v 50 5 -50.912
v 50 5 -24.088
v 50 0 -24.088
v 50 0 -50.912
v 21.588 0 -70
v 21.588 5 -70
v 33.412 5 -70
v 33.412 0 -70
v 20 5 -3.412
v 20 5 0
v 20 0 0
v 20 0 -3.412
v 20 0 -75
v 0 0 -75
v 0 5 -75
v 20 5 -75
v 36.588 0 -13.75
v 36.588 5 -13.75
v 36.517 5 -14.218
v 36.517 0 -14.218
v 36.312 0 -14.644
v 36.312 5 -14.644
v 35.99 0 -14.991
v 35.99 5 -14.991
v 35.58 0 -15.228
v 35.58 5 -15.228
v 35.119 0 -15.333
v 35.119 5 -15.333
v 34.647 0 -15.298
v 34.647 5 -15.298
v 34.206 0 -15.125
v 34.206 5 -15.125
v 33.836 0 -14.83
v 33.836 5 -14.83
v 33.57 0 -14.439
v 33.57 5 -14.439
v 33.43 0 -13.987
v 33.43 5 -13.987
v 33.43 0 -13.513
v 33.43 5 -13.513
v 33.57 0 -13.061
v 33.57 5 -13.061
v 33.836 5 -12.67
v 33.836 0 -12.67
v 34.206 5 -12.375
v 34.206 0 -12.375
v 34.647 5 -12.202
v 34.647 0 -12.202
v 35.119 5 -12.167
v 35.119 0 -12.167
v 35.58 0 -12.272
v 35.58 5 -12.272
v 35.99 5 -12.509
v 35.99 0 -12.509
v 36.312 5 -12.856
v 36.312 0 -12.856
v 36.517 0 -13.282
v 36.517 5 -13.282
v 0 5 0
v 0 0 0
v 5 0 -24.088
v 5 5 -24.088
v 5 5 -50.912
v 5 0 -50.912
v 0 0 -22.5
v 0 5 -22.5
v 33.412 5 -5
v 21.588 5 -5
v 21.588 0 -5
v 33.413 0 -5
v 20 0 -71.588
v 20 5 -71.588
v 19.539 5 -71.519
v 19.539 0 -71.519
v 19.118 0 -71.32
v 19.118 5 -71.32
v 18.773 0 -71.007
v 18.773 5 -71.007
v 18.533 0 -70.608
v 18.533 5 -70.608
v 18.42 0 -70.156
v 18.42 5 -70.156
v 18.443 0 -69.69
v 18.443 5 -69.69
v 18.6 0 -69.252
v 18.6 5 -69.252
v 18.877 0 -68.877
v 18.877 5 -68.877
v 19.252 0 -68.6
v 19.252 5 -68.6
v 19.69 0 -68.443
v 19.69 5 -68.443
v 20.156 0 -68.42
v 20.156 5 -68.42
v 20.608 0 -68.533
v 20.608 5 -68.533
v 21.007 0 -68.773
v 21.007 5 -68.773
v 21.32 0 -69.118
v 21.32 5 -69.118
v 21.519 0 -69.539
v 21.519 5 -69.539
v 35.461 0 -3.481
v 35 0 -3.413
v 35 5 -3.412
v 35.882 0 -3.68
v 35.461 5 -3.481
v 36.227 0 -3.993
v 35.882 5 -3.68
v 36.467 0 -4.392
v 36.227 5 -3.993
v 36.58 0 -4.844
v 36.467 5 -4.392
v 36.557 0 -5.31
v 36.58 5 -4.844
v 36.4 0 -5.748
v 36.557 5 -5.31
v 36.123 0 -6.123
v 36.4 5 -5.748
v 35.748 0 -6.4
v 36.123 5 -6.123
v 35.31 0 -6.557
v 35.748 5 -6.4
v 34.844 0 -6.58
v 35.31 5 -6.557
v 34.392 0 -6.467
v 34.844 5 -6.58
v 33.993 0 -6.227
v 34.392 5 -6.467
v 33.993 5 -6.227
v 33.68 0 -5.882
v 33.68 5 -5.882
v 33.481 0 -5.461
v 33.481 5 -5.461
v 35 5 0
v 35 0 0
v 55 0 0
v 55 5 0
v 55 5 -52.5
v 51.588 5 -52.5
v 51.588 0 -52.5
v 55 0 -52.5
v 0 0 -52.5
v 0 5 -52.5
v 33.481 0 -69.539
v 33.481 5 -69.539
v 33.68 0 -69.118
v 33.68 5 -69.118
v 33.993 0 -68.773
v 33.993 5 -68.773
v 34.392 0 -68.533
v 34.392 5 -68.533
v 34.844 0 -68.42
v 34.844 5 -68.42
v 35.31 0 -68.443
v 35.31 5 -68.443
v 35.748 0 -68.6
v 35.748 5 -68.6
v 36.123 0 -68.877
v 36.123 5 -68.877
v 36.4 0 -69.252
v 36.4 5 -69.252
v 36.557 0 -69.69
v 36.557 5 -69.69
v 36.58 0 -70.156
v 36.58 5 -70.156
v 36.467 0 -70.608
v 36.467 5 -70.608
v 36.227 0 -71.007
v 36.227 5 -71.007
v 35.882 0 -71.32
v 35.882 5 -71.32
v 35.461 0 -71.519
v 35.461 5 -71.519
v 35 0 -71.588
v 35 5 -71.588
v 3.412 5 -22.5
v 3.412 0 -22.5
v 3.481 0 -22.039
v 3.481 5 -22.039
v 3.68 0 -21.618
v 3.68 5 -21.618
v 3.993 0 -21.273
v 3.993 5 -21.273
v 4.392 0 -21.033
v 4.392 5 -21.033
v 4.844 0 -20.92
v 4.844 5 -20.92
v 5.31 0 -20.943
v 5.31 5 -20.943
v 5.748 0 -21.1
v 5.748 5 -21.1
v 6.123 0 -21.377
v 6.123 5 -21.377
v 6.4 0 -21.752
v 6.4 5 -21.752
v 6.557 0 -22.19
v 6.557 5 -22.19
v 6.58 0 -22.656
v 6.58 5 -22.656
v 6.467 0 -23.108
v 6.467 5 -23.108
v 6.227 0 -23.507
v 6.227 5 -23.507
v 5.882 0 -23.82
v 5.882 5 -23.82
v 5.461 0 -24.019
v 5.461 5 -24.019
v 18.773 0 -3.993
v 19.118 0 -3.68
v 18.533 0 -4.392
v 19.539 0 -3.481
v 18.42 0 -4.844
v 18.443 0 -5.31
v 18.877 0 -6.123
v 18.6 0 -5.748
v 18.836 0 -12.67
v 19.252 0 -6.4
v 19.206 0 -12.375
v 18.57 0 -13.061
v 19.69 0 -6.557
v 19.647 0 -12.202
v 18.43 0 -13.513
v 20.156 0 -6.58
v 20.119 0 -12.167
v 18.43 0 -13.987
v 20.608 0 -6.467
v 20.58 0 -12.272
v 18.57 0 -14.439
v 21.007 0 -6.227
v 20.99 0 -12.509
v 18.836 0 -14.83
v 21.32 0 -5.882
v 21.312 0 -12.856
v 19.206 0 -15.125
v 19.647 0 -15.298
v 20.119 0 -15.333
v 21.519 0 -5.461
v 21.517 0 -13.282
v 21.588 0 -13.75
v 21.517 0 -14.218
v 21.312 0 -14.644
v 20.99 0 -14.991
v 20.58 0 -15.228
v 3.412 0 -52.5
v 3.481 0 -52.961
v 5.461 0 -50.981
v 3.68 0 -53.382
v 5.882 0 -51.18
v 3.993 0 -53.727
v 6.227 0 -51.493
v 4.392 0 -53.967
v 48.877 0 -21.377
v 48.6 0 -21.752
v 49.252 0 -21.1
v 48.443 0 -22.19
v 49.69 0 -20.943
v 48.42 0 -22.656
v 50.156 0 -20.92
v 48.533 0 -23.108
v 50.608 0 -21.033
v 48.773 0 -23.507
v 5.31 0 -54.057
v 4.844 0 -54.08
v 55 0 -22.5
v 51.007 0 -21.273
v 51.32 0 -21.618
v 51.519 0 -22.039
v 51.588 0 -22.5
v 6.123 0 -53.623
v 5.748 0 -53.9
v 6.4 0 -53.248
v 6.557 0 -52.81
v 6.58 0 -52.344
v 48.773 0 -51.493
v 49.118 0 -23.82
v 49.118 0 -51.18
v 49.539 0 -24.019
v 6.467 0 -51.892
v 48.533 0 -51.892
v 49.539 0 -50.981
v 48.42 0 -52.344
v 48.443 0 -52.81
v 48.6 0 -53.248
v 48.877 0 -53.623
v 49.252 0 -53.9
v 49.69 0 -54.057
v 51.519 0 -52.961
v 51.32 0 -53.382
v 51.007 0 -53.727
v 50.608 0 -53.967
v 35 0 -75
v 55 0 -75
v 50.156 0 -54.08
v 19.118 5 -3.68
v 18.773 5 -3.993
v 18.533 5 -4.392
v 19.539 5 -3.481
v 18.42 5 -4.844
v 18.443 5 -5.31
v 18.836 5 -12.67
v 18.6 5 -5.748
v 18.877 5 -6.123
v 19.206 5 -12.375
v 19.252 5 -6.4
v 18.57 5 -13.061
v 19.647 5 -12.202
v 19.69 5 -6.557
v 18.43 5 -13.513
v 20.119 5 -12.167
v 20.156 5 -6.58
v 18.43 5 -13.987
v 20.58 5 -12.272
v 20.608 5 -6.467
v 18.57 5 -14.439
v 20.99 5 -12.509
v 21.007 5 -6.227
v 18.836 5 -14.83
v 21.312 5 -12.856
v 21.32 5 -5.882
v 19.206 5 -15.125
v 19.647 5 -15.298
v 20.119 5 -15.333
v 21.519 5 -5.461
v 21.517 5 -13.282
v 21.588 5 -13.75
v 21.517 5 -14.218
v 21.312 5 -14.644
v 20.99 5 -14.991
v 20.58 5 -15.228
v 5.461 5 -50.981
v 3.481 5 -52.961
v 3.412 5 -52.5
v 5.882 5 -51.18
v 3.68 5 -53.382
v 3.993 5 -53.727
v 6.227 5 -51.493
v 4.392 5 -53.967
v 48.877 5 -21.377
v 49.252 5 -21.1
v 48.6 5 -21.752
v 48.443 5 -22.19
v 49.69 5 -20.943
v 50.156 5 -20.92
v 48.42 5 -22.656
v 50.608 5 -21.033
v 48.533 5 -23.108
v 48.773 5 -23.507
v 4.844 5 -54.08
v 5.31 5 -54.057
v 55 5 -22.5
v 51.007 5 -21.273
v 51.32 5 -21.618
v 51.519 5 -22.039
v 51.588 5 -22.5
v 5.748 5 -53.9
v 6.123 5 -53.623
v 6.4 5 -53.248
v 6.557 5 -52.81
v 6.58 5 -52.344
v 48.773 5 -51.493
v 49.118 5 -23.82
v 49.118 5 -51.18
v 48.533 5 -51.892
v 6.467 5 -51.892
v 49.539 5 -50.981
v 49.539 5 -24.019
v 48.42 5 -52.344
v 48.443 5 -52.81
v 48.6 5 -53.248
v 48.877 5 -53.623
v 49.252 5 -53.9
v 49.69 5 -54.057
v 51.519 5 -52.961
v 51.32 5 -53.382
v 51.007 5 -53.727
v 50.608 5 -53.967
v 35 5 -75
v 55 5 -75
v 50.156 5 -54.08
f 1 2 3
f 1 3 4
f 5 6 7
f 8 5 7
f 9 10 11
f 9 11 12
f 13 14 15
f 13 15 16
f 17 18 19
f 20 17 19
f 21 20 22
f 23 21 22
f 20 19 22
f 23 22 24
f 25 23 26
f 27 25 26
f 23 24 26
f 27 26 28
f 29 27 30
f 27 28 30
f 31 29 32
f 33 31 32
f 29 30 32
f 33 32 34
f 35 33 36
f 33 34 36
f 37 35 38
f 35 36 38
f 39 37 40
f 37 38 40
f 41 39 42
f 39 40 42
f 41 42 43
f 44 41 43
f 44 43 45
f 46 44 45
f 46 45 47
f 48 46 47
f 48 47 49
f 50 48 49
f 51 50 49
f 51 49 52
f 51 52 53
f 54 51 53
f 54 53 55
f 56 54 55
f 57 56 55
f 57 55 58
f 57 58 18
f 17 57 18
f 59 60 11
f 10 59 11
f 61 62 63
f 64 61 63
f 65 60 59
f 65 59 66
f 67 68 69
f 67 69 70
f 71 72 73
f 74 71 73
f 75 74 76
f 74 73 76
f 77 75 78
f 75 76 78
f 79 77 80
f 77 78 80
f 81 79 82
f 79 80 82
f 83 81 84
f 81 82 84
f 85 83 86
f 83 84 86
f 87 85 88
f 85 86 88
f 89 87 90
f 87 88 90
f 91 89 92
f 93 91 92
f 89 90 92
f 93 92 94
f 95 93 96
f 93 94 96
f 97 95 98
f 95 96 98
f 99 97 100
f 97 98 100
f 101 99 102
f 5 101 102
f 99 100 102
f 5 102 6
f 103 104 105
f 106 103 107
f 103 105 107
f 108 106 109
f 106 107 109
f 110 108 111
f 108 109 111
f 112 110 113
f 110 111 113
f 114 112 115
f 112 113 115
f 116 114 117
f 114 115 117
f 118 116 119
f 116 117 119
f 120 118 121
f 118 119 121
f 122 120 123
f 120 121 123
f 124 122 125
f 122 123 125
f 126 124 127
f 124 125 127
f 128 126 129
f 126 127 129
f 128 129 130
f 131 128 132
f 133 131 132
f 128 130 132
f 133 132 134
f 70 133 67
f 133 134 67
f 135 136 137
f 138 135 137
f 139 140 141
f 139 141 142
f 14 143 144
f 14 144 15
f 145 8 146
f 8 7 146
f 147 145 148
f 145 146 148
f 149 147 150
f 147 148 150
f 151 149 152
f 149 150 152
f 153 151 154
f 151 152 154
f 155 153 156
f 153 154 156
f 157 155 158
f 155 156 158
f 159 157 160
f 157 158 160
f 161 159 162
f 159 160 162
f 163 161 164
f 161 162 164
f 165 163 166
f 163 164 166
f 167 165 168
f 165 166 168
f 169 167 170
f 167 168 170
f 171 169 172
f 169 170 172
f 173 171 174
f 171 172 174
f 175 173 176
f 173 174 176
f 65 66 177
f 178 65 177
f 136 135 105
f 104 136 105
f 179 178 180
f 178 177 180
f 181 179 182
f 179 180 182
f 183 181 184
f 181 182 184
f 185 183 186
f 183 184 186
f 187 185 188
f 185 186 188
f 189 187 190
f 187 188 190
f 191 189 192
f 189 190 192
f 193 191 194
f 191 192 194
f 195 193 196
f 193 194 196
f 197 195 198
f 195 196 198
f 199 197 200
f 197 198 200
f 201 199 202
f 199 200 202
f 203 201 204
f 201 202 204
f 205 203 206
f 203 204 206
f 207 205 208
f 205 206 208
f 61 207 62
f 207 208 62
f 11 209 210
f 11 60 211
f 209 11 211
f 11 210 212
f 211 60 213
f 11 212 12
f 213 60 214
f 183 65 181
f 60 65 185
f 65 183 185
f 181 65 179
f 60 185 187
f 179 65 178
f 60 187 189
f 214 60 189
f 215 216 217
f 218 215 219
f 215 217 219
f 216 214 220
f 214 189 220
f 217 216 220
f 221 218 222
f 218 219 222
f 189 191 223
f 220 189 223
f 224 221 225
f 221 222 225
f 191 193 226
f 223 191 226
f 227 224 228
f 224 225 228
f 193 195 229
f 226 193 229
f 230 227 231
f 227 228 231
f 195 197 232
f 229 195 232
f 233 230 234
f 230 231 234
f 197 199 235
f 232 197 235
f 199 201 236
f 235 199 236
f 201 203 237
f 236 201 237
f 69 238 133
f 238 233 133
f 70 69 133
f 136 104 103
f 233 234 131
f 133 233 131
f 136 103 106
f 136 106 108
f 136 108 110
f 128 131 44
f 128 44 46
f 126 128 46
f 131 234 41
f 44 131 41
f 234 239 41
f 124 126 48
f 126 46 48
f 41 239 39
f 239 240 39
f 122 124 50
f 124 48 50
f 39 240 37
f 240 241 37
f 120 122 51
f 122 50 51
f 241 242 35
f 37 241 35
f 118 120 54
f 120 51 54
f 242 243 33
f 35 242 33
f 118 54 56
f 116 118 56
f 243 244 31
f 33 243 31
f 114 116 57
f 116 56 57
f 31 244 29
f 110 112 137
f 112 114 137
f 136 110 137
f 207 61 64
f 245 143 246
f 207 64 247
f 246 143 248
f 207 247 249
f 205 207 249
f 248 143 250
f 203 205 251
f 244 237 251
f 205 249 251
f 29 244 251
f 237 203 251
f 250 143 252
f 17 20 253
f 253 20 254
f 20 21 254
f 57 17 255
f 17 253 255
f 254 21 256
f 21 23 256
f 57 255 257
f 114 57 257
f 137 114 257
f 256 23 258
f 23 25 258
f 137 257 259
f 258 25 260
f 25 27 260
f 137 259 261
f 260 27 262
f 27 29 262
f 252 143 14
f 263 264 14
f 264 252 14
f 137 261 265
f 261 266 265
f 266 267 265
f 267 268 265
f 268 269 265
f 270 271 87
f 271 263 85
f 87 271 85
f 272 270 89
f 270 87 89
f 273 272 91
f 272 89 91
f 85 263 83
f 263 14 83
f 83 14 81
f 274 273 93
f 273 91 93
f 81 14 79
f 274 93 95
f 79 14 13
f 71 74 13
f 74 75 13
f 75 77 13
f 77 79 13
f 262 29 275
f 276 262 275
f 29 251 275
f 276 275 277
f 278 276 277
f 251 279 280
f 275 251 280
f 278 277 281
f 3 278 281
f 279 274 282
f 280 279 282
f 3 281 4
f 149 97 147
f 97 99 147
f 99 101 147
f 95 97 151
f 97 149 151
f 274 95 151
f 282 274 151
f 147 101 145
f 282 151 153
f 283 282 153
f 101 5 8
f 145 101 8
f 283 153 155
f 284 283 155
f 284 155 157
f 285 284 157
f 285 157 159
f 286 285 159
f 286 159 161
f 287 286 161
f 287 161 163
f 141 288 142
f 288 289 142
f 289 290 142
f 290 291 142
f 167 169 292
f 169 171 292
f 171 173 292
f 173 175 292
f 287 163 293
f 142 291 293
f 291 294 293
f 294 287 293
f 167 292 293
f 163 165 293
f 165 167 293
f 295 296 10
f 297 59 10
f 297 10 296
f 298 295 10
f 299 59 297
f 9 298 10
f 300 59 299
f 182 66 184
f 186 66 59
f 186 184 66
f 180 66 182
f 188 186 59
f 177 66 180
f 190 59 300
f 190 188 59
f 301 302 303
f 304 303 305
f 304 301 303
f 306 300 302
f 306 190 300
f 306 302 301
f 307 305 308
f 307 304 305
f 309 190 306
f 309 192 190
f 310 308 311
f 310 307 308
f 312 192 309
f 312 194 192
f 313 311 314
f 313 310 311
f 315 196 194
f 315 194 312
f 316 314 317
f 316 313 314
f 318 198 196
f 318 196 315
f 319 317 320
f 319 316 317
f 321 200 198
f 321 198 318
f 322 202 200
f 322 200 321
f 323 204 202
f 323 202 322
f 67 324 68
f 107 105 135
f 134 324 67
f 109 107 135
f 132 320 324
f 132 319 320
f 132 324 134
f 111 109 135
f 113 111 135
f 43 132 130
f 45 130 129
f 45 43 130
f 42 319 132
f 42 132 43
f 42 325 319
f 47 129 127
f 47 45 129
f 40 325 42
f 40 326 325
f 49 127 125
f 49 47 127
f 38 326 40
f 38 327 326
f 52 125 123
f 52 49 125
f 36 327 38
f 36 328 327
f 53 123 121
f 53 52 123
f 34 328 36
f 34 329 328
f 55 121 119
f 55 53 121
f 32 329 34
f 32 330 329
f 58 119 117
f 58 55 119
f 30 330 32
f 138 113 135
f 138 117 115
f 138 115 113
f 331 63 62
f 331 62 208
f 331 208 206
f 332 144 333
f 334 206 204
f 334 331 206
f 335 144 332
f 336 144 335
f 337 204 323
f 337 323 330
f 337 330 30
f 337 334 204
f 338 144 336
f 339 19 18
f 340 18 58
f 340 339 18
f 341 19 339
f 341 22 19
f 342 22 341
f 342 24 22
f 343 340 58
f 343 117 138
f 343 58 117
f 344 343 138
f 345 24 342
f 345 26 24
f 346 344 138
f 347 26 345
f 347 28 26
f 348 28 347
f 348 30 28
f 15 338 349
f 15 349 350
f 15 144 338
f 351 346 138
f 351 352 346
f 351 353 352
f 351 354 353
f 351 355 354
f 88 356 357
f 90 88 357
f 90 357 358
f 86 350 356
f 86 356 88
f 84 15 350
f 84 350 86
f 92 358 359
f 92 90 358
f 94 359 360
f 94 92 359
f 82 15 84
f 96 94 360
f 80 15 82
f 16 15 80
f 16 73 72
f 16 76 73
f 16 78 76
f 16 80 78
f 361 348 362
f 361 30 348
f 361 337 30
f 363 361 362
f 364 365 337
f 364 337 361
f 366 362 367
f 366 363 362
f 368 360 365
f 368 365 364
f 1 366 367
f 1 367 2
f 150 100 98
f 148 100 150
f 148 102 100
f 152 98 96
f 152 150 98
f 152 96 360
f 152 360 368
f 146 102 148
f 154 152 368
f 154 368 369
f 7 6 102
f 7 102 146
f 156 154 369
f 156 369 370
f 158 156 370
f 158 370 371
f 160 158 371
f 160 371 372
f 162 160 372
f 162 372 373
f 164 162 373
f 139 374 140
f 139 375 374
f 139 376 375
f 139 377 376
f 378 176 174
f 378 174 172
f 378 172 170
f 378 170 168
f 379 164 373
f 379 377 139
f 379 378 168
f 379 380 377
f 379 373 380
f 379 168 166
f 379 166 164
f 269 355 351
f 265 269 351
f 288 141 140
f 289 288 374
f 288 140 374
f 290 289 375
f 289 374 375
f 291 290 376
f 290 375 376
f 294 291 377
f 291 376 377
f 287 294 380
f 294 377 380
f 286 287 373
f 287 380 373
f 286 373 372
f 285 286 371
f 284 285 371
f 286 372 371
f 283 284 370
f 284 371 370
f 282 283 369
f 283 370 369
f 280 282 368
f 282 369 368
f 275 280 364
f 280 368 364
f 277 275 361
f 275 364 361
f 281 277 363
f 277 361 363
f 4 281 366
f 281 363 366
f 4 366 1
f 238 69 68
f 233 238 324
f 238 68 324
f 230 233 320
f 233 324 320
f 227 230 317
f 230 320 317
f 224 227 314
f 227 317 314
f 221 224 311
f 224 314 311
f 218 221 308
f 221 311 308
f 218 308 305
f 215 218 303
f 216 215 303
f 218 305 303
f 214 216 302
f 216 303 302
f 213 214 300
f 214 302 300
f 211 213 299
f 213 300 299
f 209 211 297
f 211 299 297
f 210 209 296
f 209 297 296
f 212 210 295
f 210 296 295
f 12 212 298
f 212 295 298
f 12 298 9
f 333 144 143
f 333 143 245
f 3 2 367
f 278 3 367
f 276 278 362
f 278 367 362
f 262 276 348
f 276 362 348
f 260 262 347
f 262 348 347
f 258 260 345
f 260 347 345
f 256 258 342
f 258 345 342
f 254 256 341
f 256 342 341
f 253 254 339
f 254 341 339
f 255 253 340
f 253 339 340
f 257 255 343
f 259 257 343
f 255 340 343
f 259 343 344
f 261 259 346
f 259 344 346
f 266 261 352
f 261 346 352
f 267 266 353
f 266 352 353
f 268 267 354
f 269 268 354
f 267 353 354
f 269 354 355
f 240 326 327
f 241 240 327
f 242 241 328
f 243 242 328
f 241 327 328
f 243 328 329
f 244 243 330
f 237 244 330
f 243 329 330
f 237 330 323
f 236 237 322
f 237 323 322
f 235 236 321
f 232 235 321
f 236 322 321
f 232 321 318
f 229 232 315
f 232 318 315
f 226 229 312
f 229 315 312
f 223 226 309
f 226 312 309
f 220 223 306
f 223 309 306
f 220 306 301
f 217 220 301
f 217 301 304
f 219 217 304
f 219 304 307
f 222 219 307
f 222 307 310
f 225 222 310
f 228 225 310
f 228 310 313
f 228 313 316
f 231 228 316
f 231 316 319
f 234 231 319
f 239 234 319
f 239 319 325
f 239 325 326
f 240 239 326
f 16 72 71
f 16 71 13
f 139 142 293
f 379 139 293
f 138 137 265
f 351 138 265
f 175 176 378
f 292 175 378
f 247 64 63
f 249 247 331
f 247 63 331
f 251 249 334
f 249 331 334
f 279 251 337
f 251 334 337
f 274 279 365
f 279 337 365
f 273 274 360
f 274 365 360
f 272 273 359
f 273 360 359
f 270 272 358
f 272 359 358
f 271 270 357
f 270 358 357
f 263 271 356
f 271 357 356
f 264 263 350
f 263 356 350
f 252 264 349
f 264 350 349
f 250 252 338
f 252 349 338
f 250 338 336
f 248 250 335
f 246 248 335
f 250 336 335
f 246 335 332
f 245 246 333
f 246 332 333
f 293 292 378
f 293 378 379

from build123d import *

# Parameters (mm, degrees)
SKETCH1_W               = 55
SKETCH1_H               = 75
BOSS_EXTRUDE1_DEPTH     = 5
SKETCH5_W               = 5
SKETCH5_H               = 30
SKETCH5_W_2             = 15
SKETCH5_H_2             = 5
CUT_EXTRUDE3_DEPTH      = 1
CUT_EXTRUDE3_DEPTH_BACK = 6
SKETCH6_R               = 1.5875
CUT_EXTRUDE4_DEPTH      = 6


with BuildPart() as part:
    # Sketch1 → Boss-Extrude1 (new body)
    with BuildSketch(Plane(origin=(0, 0, 0), x_dir=(1, 0, 0), z_dir=(0, 1, 0))):
        with Locations((27.5, 37.5)):
            Rectangle(SKETCH1_W, SKETCH1_H)
    extrude(amount=BOSS_EXTRUDE1_DEPTH)

    # Sketch5 → Cut-Extrude3 (cut, two sides)
    with BuildSketch(Plane(origin=(0, 5, 0), x_dir=(1, 0, 0), z_dir=(0, 1, 0))) as cut_extrude3_sk:
        with Locations((2.5, 37.5)):
            Rectangle(SKETCH5_W, SKETCH5_H)
        with Locations((27.5, 72.5)):
            Rectangle(SKETCH5_W_2, SKETCH5_H_2)
        with Locations((52.5, 37.5)):
            Rectangle(SKETCH5_W, SKETCH5_H)
        with Locations((27.5, 2.5)):
            Rectangle(SKETCH5_W_2, SKETCH5_H_2)
    extrude(amount=CUT_EXTRUDE3_DEPTH, mode=Mode.SUBTRACT)
    extrude(cut_extrude3_sk.sketch, amount=-CUT_EXTRUDE3_DEPTH_BACK, mode=Mode.SUBTRACT)

    # Sketch6 → Cut-Extrude4 (cut, through all)
    with BuildSketch(Plane(origin=(0, 5, 0), x_dir=(1, 0, 0), z_dir=(0, 1, 0))):
        with Locations((5, 52.5)):
            Circle(SKETCH6_R)
        with Locations((5, 22.5)):
            Circle(SKETCH6_R)
        with Locations((20, 5)):
            Circle(SKETCH6_R)
        with Locations((35, 5)):
            Circle(SKETCH6_R)
        with Locations((50, 22.5)):
            Circle(SKETCH6_R)
        with Locations((50, 52.5)):
            Circle(SKETCH6_R)
        with Locations((35, 70)):
            Circle(SKETCH6_R)
        with Locations((20, 70)):
            Circle(SKETCH6_R)
        with Locations((20, 13.75)):
            Circle(SKETCH6_R)
        with Locations((35, 13.75)):
            Circle(SKETCH6_R)
    extrude(amount=-CUT_EXTRUDE4_DEPTH, mode=Mode.SUBTRACT)


solid = part.part
